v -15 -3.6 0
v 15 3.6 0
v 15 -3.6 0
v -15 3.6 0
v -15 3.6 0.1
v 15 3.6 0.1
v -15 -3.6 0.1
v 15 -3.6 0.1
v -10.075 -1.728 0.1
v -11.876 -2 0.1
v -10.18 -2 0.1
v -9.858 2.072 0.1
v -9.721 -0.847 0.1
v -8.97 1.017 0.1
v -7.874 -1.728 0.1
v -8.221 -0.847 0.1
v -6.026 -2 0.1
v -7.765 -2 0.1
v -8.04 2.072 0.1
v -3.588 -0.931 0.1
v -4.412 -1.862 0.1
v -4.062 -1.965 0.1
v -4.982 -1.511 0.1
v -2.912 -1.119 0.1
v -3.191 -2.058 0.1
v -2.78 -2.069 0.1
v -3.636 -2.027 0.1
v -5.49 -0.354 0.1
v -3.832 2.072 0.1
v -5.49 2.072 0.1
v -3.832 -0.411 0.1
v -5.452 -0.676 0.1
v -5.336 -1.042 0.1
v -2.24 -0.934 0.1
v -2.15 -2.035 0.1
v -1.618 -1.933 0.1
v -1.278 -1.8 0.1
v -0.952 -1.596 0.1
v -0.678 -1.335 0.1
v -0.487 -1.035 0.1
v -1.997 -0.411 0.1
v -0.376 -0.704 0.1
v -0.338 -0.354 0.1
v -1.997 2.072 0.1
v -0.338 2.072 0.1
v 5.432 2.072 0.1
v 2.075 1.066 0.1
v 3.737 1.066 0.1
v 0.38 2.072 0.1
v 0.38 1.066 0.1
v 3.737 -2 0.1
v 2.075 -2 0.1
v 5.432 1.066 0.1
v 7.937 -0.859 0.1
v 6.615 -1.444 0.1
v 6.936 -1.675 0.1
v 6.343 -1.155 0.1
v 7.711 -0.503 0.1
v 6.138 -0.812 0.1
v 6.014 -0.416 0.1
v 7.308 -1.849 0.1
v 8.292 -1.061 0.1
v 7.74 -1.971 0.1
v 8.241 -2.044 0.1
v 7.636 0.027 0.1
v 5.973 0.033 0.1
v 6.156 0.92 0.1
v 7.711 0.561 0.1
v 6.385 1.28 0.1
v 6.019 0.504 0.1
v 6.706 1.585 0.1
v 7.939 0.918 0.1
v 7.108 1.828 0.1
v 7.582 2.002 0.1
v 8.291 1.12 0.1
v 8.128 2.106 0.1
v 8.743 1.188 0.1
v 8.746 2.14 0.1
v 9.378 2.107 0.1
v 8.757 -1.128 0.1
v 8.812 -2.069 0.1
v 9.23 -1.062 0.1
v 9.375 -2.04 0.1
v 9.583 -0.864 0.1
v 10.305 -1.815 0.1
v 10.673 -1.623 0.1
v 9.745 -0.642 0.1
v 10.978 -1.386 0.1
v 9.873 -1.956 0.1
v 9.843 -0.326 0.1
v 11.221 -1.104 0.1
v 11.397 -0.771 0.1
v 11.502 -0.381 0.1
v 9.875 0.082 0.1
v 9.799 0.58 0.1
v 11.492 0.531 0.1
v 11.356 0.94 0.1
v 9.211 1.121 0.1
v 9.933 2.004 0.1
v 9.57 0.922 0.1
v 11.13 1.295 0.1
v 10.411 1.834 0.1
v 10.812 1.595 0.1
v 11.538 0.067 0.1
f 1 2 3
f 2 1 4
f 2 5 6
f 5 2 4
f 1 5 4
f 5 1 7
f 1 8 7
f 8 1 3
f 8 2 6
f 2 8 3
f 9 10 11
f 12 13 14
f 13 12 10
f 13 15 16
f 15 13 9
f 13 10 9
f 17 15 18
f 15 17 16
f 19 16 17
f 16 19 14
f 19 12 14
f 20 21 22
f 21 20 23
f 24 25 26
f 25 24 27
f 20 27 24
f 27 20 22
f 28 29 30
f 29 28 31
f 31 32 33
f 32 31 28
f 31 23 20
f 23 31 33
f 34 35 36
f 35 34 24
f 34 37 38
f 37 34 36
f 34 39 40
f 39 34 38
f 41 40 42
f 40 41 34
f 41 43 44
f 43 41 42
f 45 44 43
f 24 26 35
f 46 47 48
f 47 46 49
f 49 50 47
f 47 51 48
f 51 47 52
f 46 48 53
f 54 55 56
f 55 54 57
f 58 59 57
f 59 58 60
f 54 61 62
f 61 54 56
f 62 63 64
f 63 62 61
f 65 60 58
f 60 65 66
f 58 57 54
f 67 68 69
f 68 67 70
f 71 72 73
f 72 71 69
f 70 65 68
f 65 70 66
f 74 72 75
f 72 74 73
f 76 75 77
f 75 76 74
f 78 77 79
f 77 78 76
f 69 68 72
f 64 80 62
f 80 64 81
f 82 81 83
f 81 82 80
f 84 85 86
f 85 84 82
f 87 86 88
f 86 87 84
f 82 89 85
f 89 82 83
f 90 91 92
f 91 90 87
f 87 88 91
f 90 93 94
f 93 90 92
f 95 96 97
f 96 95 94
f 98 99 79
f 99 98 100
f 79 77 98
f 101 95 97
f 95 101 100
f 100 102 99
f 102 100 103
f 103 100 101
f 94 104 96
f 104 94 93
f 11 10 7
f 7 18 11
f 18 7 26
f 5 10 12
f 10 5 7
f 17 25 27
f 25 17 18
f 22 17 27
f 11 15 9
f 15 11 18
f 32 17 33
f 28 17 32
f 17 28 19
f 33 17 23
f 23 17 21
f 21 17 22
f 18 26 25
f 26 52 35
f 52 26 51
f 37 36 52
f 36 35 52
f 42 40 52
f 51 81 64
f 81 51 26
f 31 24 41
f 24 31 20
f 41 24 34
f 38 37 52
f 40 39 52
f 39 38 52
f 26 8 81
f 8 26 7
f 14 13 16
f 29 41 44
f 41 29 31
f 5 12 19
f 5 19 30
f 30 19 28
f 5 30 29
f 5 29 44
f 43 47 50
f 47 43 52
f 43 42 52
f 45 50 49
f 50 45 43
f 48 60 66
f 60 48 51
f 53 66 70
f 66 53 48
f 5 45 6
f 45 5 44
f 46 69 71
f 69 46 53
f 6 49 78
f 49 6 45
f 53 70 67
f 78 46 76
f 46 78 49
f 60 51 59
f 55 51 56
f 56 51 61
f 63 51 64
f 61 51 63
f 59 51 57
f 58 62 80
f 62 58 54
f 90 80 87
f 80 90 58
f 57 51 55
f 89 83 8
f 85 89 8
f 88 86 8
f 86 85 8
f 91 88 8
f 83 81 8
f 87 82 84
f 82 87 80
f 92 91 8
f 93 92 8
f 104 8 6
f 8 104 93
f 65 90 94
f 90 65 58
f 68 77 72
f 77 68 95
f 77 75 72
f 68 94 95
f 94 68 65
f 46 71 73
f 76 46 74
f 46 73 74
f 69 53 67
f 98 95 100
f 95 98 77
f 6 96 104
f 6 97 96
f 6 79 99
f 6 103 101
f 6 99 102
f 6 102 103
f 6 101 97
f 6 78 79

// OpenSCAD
// file: ../p/4-4edge.scad
use <../lib.scad>
$fa=1; $fs=0.2;
function ldraw_lib__4_4edge(realsolid=false) = [
// 0 Circle 1.0
// 0 Name: 4-4edge.dat
// 0 Author: James Jessiman
// 0 !LDRAW_ORG Primitive UPDATE 2017-01
// 0 !LICENSE Licensed under CC BY 2.0 and CC BY 4.0 : see CAreadme.txt
// 
// 0 BFC CERTIFY CCW
  [0,"BFC","CERTIFY"],
  [0,"BFC","CCW"],
// 
// 0 !HISTORY 1998-12-15 [PTadmin] Official Update 1998-10
// 0 !HISTORY 2005-12-28 [PTadmin] Official Update 2005-01
// 0 !HISTORY 2007-06-24 [PTadmin] Header formatted for Contributor Agreement
// 0 !HISTORY 2008-07-01 [PTadmin] Official Update 2008-01
// 0 !HISTORY 2017-01-15 [Steffen] BFCed
// 0 !HISTORY 2017-12-30 [PTadmin] Official Update 2017-01
// 
// 
// 2 24 1 0 0 0.9239 0 0.3827
  [2,24,1,0,0,0.9239,0,0.3827],
// 2 24 0.9239 0 0.3827 0.7071 0 0.7071
  [2,24,0.9239,0,0.3827,0.7071,0,0.7071],
// 2 24 0.7071 0 0.7071 0.3827 0 0.9239
  [2,24,0.7071,0,0.7071,0.3827,0,0.9239],
// 2 24 0.3827 0 0.9239 0 0 1
  [2,24,0.3827,0,0.9239,0,0,1],
// 2 24 0 0 1 -0.3827 0 0.9239
  [2,24,0,0,1,-0.3827,0,0.9239],
// 2 24 -0.3827 0 0.9239 -0.7071 0 0.7071
  [2,24,-0.3827,0,0.9239,-0.7071,0,0.7071],
// 2 24 -0.7071 0 0.7071 -0.9239 0 0.3827
  [2,24,-0.7071,0,0.7071,-0.9239,0,0.3827],
// 2 24 -0.9239 0 0.3827 -1 0 -0
  [2,24,-0.9239,0,0.3827,-1,0,-0],
// 2 24 -1 0 -0 -0.9239 0 -0.3827
  [2,24,-1,0,-0,-0.9239,0,-0.3827],
// 2 24 -0.9239 0 -0.3827 -0.7071 0 -0.7071
  [2,24,-0.9239,0,-0.3827,-0.7071,0,-0.7071],
// 2 24 -0.7071 0 -0.7071 -0.3827 0 -0.9239
  [2,24,-0.7071,0,-0.7071,-0.3827,0,-0.9239],
// 2 24 -0.3827 0 -0.9239 0 0 -1
  [2,24,-0.3827,0,-0.9239,0,0,-1],
// 2 24 0 0 -1 0.3827 0 -0.9239
  [2,24,0,0,-1,0.3827,0,-0.9239],
// 2 24 0.3827 0 -0.9239 0.7071 0 -0.7071
  [2,24,0.3827,0,-0.9239,0.7071,0,-0.7071],
// 2 24 0.7071 0 -0.7071 0.9239 0 -0.3827
  [2,24,0.7071,0,-0.7071,0.9239,0,-0.3827],
// 2 24 0.9239 0 -0.3827 1 0 0
  [2,24,0.9239,0,-0.3827,1,0,0],
];
module ldraw_lib__4_4edge(step=0, col=false, unit=2/5, alt=false, line=0.2, solid=!$preview)
    makepoly(ldraw_lib__4_4edge(solid), step=step, col=col, unit=unit, alt=alt, line=line, solid=solid);
ldraw_lib__4_4edge(line=0.2);
// file: ../p/4-4disc.scad
use <../lib.scad>
$fa=1; $fs=0.2;
function ldraw_lib__4_4disc(realsolid=false) = [
// 0 Disc 1.0
// 0 Name: 4-4disc.dat
// 0 Author: James Jessiman
// 0 !LDRAW_ORG Primitive UPDATE 2002-02
// 0 !LICENSE Licensed under CC BY 2.0 and CC BY 4.0 : see CAreadme.txt
// 
// 0 BFC CERTIFY CCW
  [0,"BFC","CERTIFY"],
  [0,"BFC","CCW"],
// 
// 0 !HISTORY 1998-12-15 [PTadmin] Official Update 1998-10
// 0 !HISTORY 2002-03-23 [sbliss] Added BFC statement
// 0 !HISTORY 2002-04-25 [PTadmin] Official Update 2002-02
// 0 !HISTORY 2007-06-24 [PTadmin] Header formatted for Contributor Agreement
// 0 !HISTORY 2008-07-01 [PTadmin] Official Update 2008-01
// 
// 
// 3 16 0 0 0 1 0 0 0.9239 0 0.3827
  [3,16,0,0,0,1,0,0,0.9239,0,0.3827],
// 3 16 0 0 0 0.9239 0 0.3827 0.7071 0 0.7071
  [3,16,0,0,0,0.9239,0,0.3827,0.7071,0,0.7071],
// 3 16 0 0 0 0.7071 0 0.7071 0.3827 0 0.9239
  [3,16,0,0,0,0.7071,0,0.7071,0.3827,0,0.9239],
// 3 16 0 0 0 0.3827 0 0.9239 0 0 1
  [3,16,0,0,0,0.3827,0,0.9239,0,0,1],
// 3 16 0 0 0 0 0 1 -0.3827 0 0.9239
  [3,16,0,0,0,0,0,1,-0.3827,0,0.9239],
// 3 16 0 0 0 -0.3827 0 0.9239 -0.7071 0 0.7071
  [3,16,0,0,0,-0.3827,0,0.9239,-0.7071,0,0.7071],
// 3 16 0 0 0 -0.7071 0 0.7071 -0.9239 0 0.3827
  [3,16,0,0,0,-0.7071,0,0.7071,-0.9239,0,0.3827],
// 3 16 0 0 0 -0.9239 0 0.3827 -1 0 -0
  [3,16,0,0,0,-0.9239,0,0.3827,-1,0,-0],
// 3 16 0 0 0 -1 0 -0 -0.9239 0 -0.3827
  [3,16,0,0,0,-1,0,-0,-0.9239,0,-0.3827],
// 3 16 0 0 0 -0.9239 0 -0.3827 -0.7071 0 -0.7071
  [3,16,0,0,0,-0.9239,0,-0.3827,-0.7071,0,-0.7071],
// 3 16 0 0 0 -0.7071 0 -0.7071 -0.3827 0 -0.9239
  [3,16,0,0,0,-0.7071,0,-0.7071,-0.3827,0,-0.9239],
// 3 16 0 0 0 -0.3827 0 -0.9239 0 0 -1
  [3,16,0,0,0,-0.3827,0,-0.9239,0,0,-1],
// 3 16 0 0 0 0 0 -1 0.3827 0 -0.9239
  [3,16,0,0,0,0,0,-1,0.3827,0,-0.9239],
// 3 16 0 0 0 0.3827 0 -0.9239 0.7071 0 -0.7071
  [3,16,0,0,0,0.3827,0,-0.9239,0.7071,0,-0.7071],
// 3 16 0 0 0 0.7071 0 -0.7071 0.9239 0 -0.3827
  [3,16,0,0,0,0.7071,0,-0.7071,0.9239,0,-0.3827],
// 3 16 0 0 0 0.9239 0 -0.3827 1 0 0
  [3,16,0,0,0,0.9239,0,-0.3827,1,0,0],
// 0
];
module ldraw_lib__4_4disc(step=0, col=false, unit=2/5, alt=false, line=0.2, solid=!$preview)
    makepoly(ldraw_lib__4_4disc(solid), step=step, col=col, unit=unit, alt=alt, line=line, solid=solid);
ldraw_lib__4_4disc(line=0.2);
// file: ../p/4-4cyli.scad
use <../lib.scad>
$fa=1; $fs=0.2;
function ldraw_lib__4_4cyli(realsolid=false) = [
// 0 Cylinder 1.0
// 0 Name: 4-4cyli.dat
// 0 Author: James Jessiman
// 0 !LDRAW_ORG Primitive UPDATE 2005-01
// 0 !LICENSE Licensed under CC BY 2.0 and CC BY 4.0 : see CAreadme.txt
// 
// 0 BFC CERTIFY CCW
  [0,"BFC","CERTIFY"],
  [0,"BFC","CCW"],
// 
// 0 !HISTORY 1998-12-15 [PTadmin] Official Update 1998-10
// 0 !HISTORY 2002-03-23 [sbliss] Added BFC statement; merged headers from files in distributions LDraw 0.27 and Complete.
// 0 !HISTORY 2002-04-25 [PTadmin] Official Update 2002-02
// 0 !HISTORY 2004-12-14 [guyvivan] BFC CCW
// 0 !HISTORY 2005-12-28 [PTadmin] Official Update 2005-01
// 0 !HISTORY 2007-06-24 [PTadmin] Header formatted for Contributor Agreement
// 0 !HISTORY 2008-07-01 [PTadmin] Official Update 2008-01
// 
// 
// 4 16 1 1 0 0.9239 1 0.3827 0.9239 0 0.3827 1 0 0
  [4,16,1,1,0,0.9239,1,0.3827,0.9239,0,0.3827,1,0,0],
// 5 24 1 0 0 1 1 0 0.9239 0 0.3827 0.9239 0 -0.3827
  [5,24,1,0,0,1,1,0,0.9239,0,0.3827,0.9239,0,-0.3827],
// 4 16 0.9239 1 0.3827 0.7071 1 0.7071 0.7071 0 0.7071 0.9239 0 0.3827
  [4,16,0.9239,1,0.3827,0.7071,1,0.7071,0.7071,0,0.7071,0.9239,0,0.3827],
// 5 24 0.9239 0 0.3827 0.9239 1 0.3827 0.7071 0 0.7071 1 0 0
  [5,24,0.9239,0,0.3827,0.9239,1,0.3827,0.7071,0,0.7071,1,0,0],
// 4 16 0.7071 1 0.7071 0.3827 1 0.9239 0.3827 0 0.9239 0.7071 0 0.7071
  [4,16,0.7071,1,0.7071,0.3827,1,0.9239,0.3827,0,0.9239,0.7071,0,0.7071],
// 5 24 0.7071 0 0.7071 0.7071 1 0.7071 0.3827 0 0.9239 0.9239 0 0.3827
  [5,24,0.7071,0,0.7071,0.7071,1,0.7071,0.3827,0,0.9239,0.9239,0,0.3827],
// 4 16 0.3827 1 0.9239 0 1 1 0 0 1 0.3827 0 0.9239
  [4,16,0.3827,1,0.9239,0,1,1,0,0,1,0.3827,0,0.9239],
// 5 24 0.3827 0 0.9239 0.3827 1 0.9239 0 0 1 0.7071 0 0.7071
  [5,24,0.3827,0,0.9239,0.3827,1,0.9239,0,0,1,0.7071,0,0.7071],
// 4 16 0 1 1 -0.3827 1 0.9239 -0.3827 0 0.9239 0 0 1
  [4,16,0,1,1,-0.3827,1,0.9239,-0.3827,0,0.9239,0,0,1],
// 5 24 0 0 1 0 1 1 -0.3827 0 0.9239 0.3827 0 0.9239
  [5,24,0,0,1,0,1,1,-0.3827,0,0.9239,0.3827,0,0.9239],
// 4 16 -0.3827 1 0.9239 -0.7071 1 0.7071 -0.7071 0 0.7071 -0.3827 0 0.9239
  [4,16,-0.3827,1,0.9239,-0.7071,1,0.7071,-0.7071,0,0.7071,-0.3827,0,0.9239],
// 5 24 -0.3827 0 0.9239 -0.3827 1 0.9239 -0.7071 0 0.7071 0 0 1
  [5,24,-0.3827,0,0.9239,-0.3827,1,0.9239,-0.7071,0,0.7071,0,0,1],
// 4 16 -0.7071 1 0.7071 -0.9239 1 0.3827 -0.9239 0 0.3827 -0.7071 0 0.7071
  [4,16,-0.7071,1,0.7071,-0.9239,1,0.3827,-0.9239,0,0.3827,-0.7071,0,0.7071],
// 5 24 -0.7071 0 0.7071 -0.7071 1 0.7071 -0.9239 0 0.3827 -0.3827 0 0.9239
  [5,24,-0.7071,0,0.7071,-0.7071,1,0.7071,-0.9239,0,0.3827,-0.3827,0,0.9239],
// 4 16 -0.9239 1 0.3827 -1 1 0 -1 0 0 -0.9239 0 0.3827
  [4,16,-0.9239,1,0.3827,-1,1,0,-1,0,0,-0.9239,0,0.3827],
// 5 24 -0.9239 0 0.3827 -0.9239 1 0.3827 -1 0 0 -0.7071 0 0.7071
  [5,24,-0.9239,0,0.3827,-0.9239,1,0.3827,-1,0,0,-0.7071,0,0.7071],
// 4 16 -1 1 0 -0.9239 1 -0.3827 -0.9239 0 -0.3827 -1 0 0
  [4,16,-1,1,0,-0.9239,1,-0.3827,-0.9239,0,-0.3827,-1,0,0],
// 5 24 -1 0 0 -1 1 0 -0.9239 0 -0.3827 -0.9239 0 0.3827
  [5,24,-1,0,0,-1,1,0,-0.9239,0,-0.3827,-0.9239,0,0.3827],
// 4 16 -0.9239 1 -0.3827 -0.7071 1 -0.7071 -0.7071 0 -0.7071 -0.9239 0 -0.3827
  [4,16,-0.9239,1,-0.3827,-0.7071,1,-0.7071,-0.7071,0,-0.7071,-0.9239,0,-0.3827],
// 5 24 -0.9239 0 -0.3827 -0.9239 1 -0.3827 -0.7071 0 -0.7071 -1 0 0
  [5,24,-0.9239,0,-0.3827,-0.9239,1,-0.3827,-0.7071,0,-0.7071,-1,0,0],
// 4 16 -0.7071 1 -0.7071 -0.3827 1 -0.9239 -0.3827 0 -0.9239 -0.7071 0 -0.7071
  [4,16,-0.7071,1,-0.7071,-0.3827,1,-0.9239,-0.3827,0,-0.9239,-0.7071,0,-0.7071],
// 5 24 -0.7071 0 -0.7071 -0.7071 1 -0.7071 -0.3827 0 -0.9239 -0.9239 0 -0.3827
  [5,24,-0.7071,0,-0.7071,-0.7071,1,-0.7071,-0.3827,0,-0.9239,-0.9239,0,-0.3827],
// 4 16 -0.3827 1 -0.9239 0 1 -1 0 0 -1 -0.3827 0 -0.9239
  [4,16,-0.3827,1,-0.9239,0,1,-1,0,0,-1,-0.3827,0,-0.9239],
// 5 24 -0.3827 0 -0.9239 -0.3827 1 -0.9239 0 0 -1 -0.7071 0 -0.7071
  [5,24,-0.3827,0,-0.9239,-0.3827,1,-0.9239,0,0,-1,-0.7071,0,-0.7071],
// 4 16 0 1 -1 0.3827 1 -0.9239 0.3827 0 -0.9239 0 0 -1
  [4,16,0,1,-1,0.3827,1,-0.9239,0.3827,0,-0.9239,0,0,-1],
// 5 24 0 0 -1 0 1 -1 0.3827 0 -0.9239 -0.3827 0 -0.9239
  [5,24,0,0,-1,0,1,-1,0.3827,0,-0.9239,-0.3827,0,-0.9239],
// 4 16 0.3827 1 -0.9239 0.7071 1 -0.7071 0.7071 0 -0.7071 0.3827 0 -0.9239
  [4,16,0.3827,1,-0.9239,0.7071,1,-0.7071,0.7071,0,-0.7071,0.3827,0,-0.9239],
// 5 24 0.3827 0 -0.9239 0.3827 1 -0.9239 0.7071 0 -0.7071 0 0 -1
  [5,24,0.3827,0,-0.9239,0.3827,1,-0.9239,0.7071,0,-0.7071,0,0,-1],
// 4 16 0.7071 1 -0.7071 0.9239 1 -0.3827 0.9239 0 -0.3827 0.7071 0 -0.7071
  [4,16,0.7071,1,-0.7071,0.9239,1,-0.3827,0.9239,0,-0.3827,0.7071,0,-0.7071],
// 5 24 0.7071 0 -0.7071 0.7071 1 -0.7071 0.9239 0 -0.3827 0.3827 0 -0.9239
  [5,24,0.7071,0,-0.7071,0.7071,1,-0.7071,0.9239,0,-0.3827,0.3827,0,-0.9239],
// 4 16 0.9239 1 -0.3827 1 1 0 1 0 0 0.9239 0 -0.3827
  [4,16,0.9239,1,-0.3827,1,1,0,1,0,0,0.9239,0,-0.3827],
// 5 24 0.9239 0 -0.3827 0.9239 1 -0.3827 1 0 0 0.7071 0 -0.7071
  [5,24,0.9239,0,-0.3827,0.9239,1,-0.3827,1,0,0,0.7071,0,-0.7071],
// 0
];
module ldraw_lib__4_4cyli(step=0, col=false, unit=2/5, alt=false, line=0.2, solid=!$preview)
    makepoly(ldraw_lib__4_4cyli(solid), step=step, col=col, unit=unit, alt=alt, line=line, solid=solid);
ldraw_lib__4_4cyli(line=0.2);
// file: ../p/stud3.scad
use <../lib.scad>
use <4-4cyli.scad>
use <4-4disc.scad>
use <4-4edge.scad>
$fa=1; $fs=0.2;
function ldraw_lib__stud3(realsolid=false) = realsolid ? 
    [openscad(translate([0,0,-eps()], o=cylinder(4+eps(), r=4)),2)] : [
// 0 Stud Tube Solid
// 0 Name: stud3.dat
// 0 Author: James Jessiman
// 0 !LDRAW_ORG Primitive UPDATE 2012-01
// 0 !LICENSE Licensed under CC BY 2.0 and CC BY 4.0 : see CAreadme.txt
// 
// 0 BFC CERTIFY CCW
  [0,"BFC","CERTIFY"],
  [0,"BFC","CCW"],
// 
// 0 !HISTORY 2002-04-04 [sbliss] Modified for BFC compliance
// 0 !HISTORY 2002-04-25 [PTadmin] Official Update 2002-02
// 0 !HISTORY 2007-06-24 [PTadmin] Header formatted for Contributor Agreement
// 0 !HISTORY 2008-07-01 [PTadmin] Official Update 2008-01
// 0 !HISTORY 2012-02-16 [Philo] Changed to CCW
// 0 !HISTORY 2012-03-30 [PTadmin] Official Update 2012-01
// 
// 
// 1 16 0 -4 0 4 0 0 0 1 0 0 0 4 4-4edge.dat
  [1,16,0,-4,0,4,0,0,0,1,0,0,0,4, ldraw_lib__4_4edge(realsolid)],
// 1 16 0 0 0 4 0 0 0 1 0 0 0 4 4-4edge.dat
  [1,16,0,0,0,4,0,0,0,1,0,0,0,4, ldraw_lib__4_4edge(realsolid)],
// 1 16 0 -4 0 4 0 0 0 1 0 0 0 4 4-4disc.dat
  [1,16,0,-4,0,4,0,0,0,1,0,0,0,4, ldraw_lib__4_4disc(realsolid)],
// 1 16 0 -4 0 4 0 0 0 4 0 0 0 4 4-4cyli.dat
  [1,16,0,-4,0,4,0,0,0,4,0,0,0,4, ldraw_lib__4_4cyli(realsolid)],
];
module ldraw_lib__stud3(step=0, col=false, unit=2/5, alt=false, line=0.2, solid=!$preview)
    makepoly(ldraw_lib__stud3(solid), step=step, col=col, unit=unit, alt=alt, line=line, solid=solid);
ldraw_lib__stud3(line=0.2);
// file: ../p/stud.scad
use <../lib.scad>
use <4-4cyli.scad>
use <4-4disc.scad>
use <4-4edge.scad>
$fa=1; $fs=0.2;
function ldraw_lib__stud(realsolid=false) = realsolid ? 
    [openscad(translate([0,0,-eps()], o=cylinder(4+eps(), r=6)),2)] : [
// 0 Stud
// 0 Name: stud.dat
// 0 Author: James Jessiman
// 0 !LDRAW_ORG Primitive UPDATE 2012-01
// 0 !LICENSE Licensed under CC BY 2.0 and CC BY 4.0 : see CAreadme.txt
// 
// 0 BFC CERTIFY CCW
  [0,"BFC","CERTIFY"],
  [0,"BFC","CCW"],
// 
// 0 !HISTORY 2002-04-04 [sbliss] Modified for BFC compliance
// 0 !HISTORY 2002-04-25 [PTadmin] Official Update 2002-02
// 0 !HISTORY 2007-06-24 [PTadmin] Header formatted for Contributor Agreement
// 0 !HISTORY 2008-07-01 [PTadmin] Official Update 2008-01
// 0 !HISTORY 2012-02-16 [Philo] Changed to CCW
// 0 !HISTORY 2012-03-30 [PTadmin] Official Update 2012-01
// 
// 
// 1 16 0 0 0 6 0 0 0 1 0 0 0 6 4-4edge.dat
  [1,16,0,0,0,6,0,0,0,1,0,0,0,6, ldraw_lib__4_4edge(realsolid)],
// 1 16 0 -4 0 6 0 0 0 1 0 0 0 6 4-4edge.dat
  [1,16,0,-4,0,6,0,0,0,1,0,0,0,6, ldraw_lib__4_4edge(realsolid)],
// 1 16 0 0 0 6 0 0 0 -4 0 0 0 6 4-4cyli.dat
  [1,16,0,0,0,6,0,0,0,-4,0,0,0,6, ldraw_lib__4_4cyli(realsolid)],
// 1 16 0 -4 0 6 0 0 0 1 0 0 0 6 4-4disc.dat
  [1,16,0,-4,0,6,0,0,0,1,0,0,0,6, ldraw_lib__4_4disc(realsolid)],
];
module ldraw_lib__stud(step=0, col=false, unit=2/5, alt=false, line=0.2, solid=!$preview)
    makepoly(ldraw_lib__stud(solid), step=step, col=col, unit=unit, alt=alt, line=line, solid=solid);
ldraw_lib__stud(line=0.2);
// file: ../p/box5.scad
use <../lib.scad>
$fa=1; $fs=0.2;
function ldraw_lib__box5(realsolid=false) = [
// 0 Box with 5 Faces and All Edges
// 0 Name: box5.dat
// 0 Author: James Jessiman
// 0 !LDRAW_ORG Primitive UPDATE 2012-01
// 0 !LICENSE Licensed under CC BY 2.0 and CC BY 4.0 : see CAreadme.txt
// 
// 0 BFC CERTIFY CCW
  [0,"BFC","CERTIFY"],
  [0,"BFC","CCW"],
// 
// 0 !HISTORY 2002-04-03 [sbliss] Modified for BFC compliance
// 0 !HISTORY 2002-04-25 [PTadmin] Official Update 2002-02
// 0 !HISTORY 2007-06-24 [PTadmin] Header formatted for Contributor Agreement
// 0 !HISTORY 2008-07-01 [PTadmin] Official Update 2008-01
// 0 !HISTORY 2012-02-16 [Philo] Changed to CCW
// 0 !HISTORY 2012-03-30 [PTadmin] Official Update 2012-01
// 
// 
// 2 24 1 1 1 -1 1 1
  [2,24,1,1,1,-1,1,1],
// 2 24 -1 1 1 -1 1 -1
  [2,24,-1,1,1,-1,1,-1],
// 2 24 -1 1 -1 1 1 -1
  [2,24,-1,1,-1,1,1,-1],
// 2 24 1 1 -1 1 1 1
  [2,24,1,1,-1,1,1,1],
// 2 24 1 0 1 -1 0 1
  [2,24,1,0,1,-1,0,1],
// 2 24 -1 0 1 -1 0 -1
  [2,24,-1,0,1,-1,0,-1],
// 2 24 -1 0 -1 1 0 -1
  [2,24,-1,0,-1,1,0,-1],
// 2 24 1 0 -1 1 0 1
  [2,24,1,0,-1,1,0,1],
// 2 24 1 0 1 1 1 1
  [2,24,1,0,1,1,1,1],
// 2 24 -1 0 1 -1 1 1
  [2,24,-1,0,1,-1,1,1],
// 2 24 1 0 -1 1 1 -1
  [2,24,1,0,-1,1,1,-1],
// 2 24 -1 0 -1 -1 1 -1
  [2,24,-1,0,-1,-1,1,-1],
// 4 16 -1 1 1 1 1 1 1 1 -1 -1 1 -1
  [4,16,-1,1,1,1,1,1,1,1,-1,-1,1,-1],
// 4 16 -1 1 1 -1 0 1 1 0 1 1 1 1
  [4,16,-1,1,1,-1,0,1,1,0,1,1,1,1],
// 4 16 -1 1 -1 -1 0 -1 -1 0 1 -1 1 1
  [4,16,-1,1,-1,-1,0,-1,-1,0,1,-1,1,1],
// 4 16 1 1 -1 1 0 -1 -1 0 -1 -1 1 -1
  [4,16,1,1,-1,1,0,-1,-1,0,-1,-1,1,-1],
// 4 16 1 1 1 1 0 1 1 0 -1 1 1 -1
  [4,16,1,1,1,1,0,1,1,0,-1,1,1,-1],
];
module ldraw_lib__box5(step=0, col=false, unit=2/5, alt=false, line=0.2, solid=!$preview)
    makepoly(ldraw_lib__box5(solid), step=step, col=col, unit=unit, alt=alt, line=line, solid=solid);
ldraw_lib__box5(line=0.2);
// file: ../p/box4t.scad
use <../lib.scad>
$fa=1; $fs=0.2;
function ldraw_lib__box4t(realsolid=false) = [
// 0 Box with 4 Adjacent Faces and All Edges
// 0 Name: box4t.dat
// 0 Author: Tore Eriksson [Tore_Eriksson]
// 0 !LDRAW_ORG Primitive UPDATE 2003-02
// 0 !LICENSE Licensed under CC BY 2.0 and CC BY 4.0 : see CAreadme.txt
// 
// 0 BFC CERTIFY CCW
  [0,"BFC","CERTIFY"],
  [0,"BFC","CCW"],
// 
// 0 !HISTORY 1997-09-29 [PTadmin] Official Update 1997-15
// 0 !HISTORY 2002-08-31 [izanette] Modified with WINDZ for BFC compliance
// 0 !HISTORY 2003-08-01 [PTadmin] Official Update 2003-02
// 0 !HISTORY 2007-06-24 [PTadmin] Header formatted for Contributor Agreement
// 0 !HISTORY 2008-07-01 [PTadmin] Official Update 2008-01
// 
// 
// 2 24 1 1 1 -1 1 1
  [2,24,1,1,1,-1,1,1],
// 2 24 -1 1 1 -1 1 -1
  [2,24,-1,1,1,-1,1,-1],
// 2 24 -1 1 -1 1 1 -1
  [2,24,-1,1,-1,1,1,-1],
// 2 24 1 1 -1 1 1 1
  [2,24,1,1,-1,1,1,1],
// 2 24 1 0 1 -1 0 1
  [2,24,1,0,1,-1,0,1],
// 2 24 -1 0 1 -1 0 -1
  [2,24,-1,0,1,-1,0,-1],
// 2 24 -1 0 -1 1 0 -1
  [2,24,-1,0,-1,1,0,-1],
// 2 24 1 0 -1 1 0 1
  [2,24,1,0,-1,1,0,1],
// 2 24 1 0 1 1 1 1
  [2,24,1,0,1,1,1,1],
// 2 24 -1 0 1 -1 1 1
  [2,24,-1,0,1,-1,1,1],
// 2 24 1 0 -1 1 1 -1
  [2,24,1,0,-1,1,1,-1],
// 2 24 -1 0 -1 -1 1 -1
  [2,24,-1,0,-1,-1,1,-1],
// 4 16 1 1 1 1 1 -1 -1 1 -1 -1 1 1
  [4,16,1,1,1,1,1,-1,-1,1,-1,-1,1,1],
// 4 16 1 1 1 -1 1 1 -1 0 1 1 0 1
  [4,16,1,1,1,-1,1,1,-1,0,1,1,0,1],
// 4 16 -1 1 1 -1 1 -1 -1 0 -1 -1 0 1
  [4,16,-1,1,1,-1,1,-1,-1,0,-1,-1,0,1],
// 0 4 16 -1 1 -1 -1 0 -1 1 0 -1 1 1 -1
// 4 16 1 1 -1 1 1 1 1 0 1 1 0 -1
  [4,16,1,1,-1,1,1,1,1,0,1,1,0,-1],
// 0
];
module ldraw_lib__box4t(step=0, col=false, unit=2/5, alt=false, line=0.2, solid=!$preview)
    makepoly(ldraw_lib__box4t(solid), step=step, col=col, unit=unit, alt=alt, line=line, solid=solid);
ldraw_lib__box4t(line=0.2);
// file: s/3004s01.scad
use <../../lib.scad>
use <../../p/box4t.scad>
use <../../p/box5.scad>
use <../../p/stud.scad>
use <../../p/stud3.scad>
$fa=1; $fs=0.2;
function ldraw_lib__s__3004s01(realsolid=false) = [
// 0 ~Brick  1 x  2 without Front Face
// 0 Name: s\3004s01.dat
// 0 Author: James Jessiman
// 0 !LDRAW_ORG Subpart UPDATE 2003-03
// 0 !LICENSE Licensed under CC BY 2.0 and CC BY 4.0 : see CAreadme.txt
// 
// 0 BFC CERTIFY CCW
  [0,"BFC","CERTIFY"],
  [0,"BFC","CCW"],
// 
// 0 !HISTORY 2003-09-07 [jriley] Subfiling, BFC
// 0 !HISTORY 2003-12-19 [PTadmin] Official Update 2003-03
// 0 !HISTORY 2007-08-29 [PTadmin] Header formatted for Contributor Agreement
// 0 !HISTORY 2008-07-01 [PTadmin] Official Update 2008-01
// 
// 
// 1 16 0 4 0 1 0 0 0 -5 0 0 0 1 stud3.dat
  [1,16,0,4,0,1,0,0,0,-5,0,0,0,1, ldraw_lib__stud3(realsolid)],
// 0 BFC INVERTNEXT
  [0,"BFC","INVERTNEXT"],
// 1 16 0 24 0 16 0 0 0 -20 0 0 0 6 box5.dat
  [1,16,0,24,0,16,0,0,0,-20,0,0,0,6, ldraw_lib__box5(realsolid)],
// 4 16 20 24 10 16 24 6 -16 24 6 -20 24 10
  [4,16,20,24,10,16,24,6,-16,24,6,-20,24,10],
// 4 16 -20 24 10 -16 24 6 -16 24 -6 -20 24 -10
  [4,16,-20,24,10,-16,24,6,-16,24,-6,-20,24,-10],
// 4 16 -20 24 -10 -16 24 -6 16 24 -6 20 24 -10
  [4,16,-20,24,-10,-16,24,-6,16,24,-6,20,24,-10],
// 4 16 20 24 -10 16 24 -6 16 24 6 20 24 10
  [4,16,20,24,-10,16,24,-6,16,24,6,20,24,10],
// 1 16 0 24 0 20 0 0 0 -24 0 0 0 10 box4t.dat
  [1,16,0,24,0,20,0,0,0,-24,0,0,0,10, ldraw_lib__box4t(realsolid)],
// 1 16 10 0 0 1 0 0 0 1 0 0 0 1 stud.dat
  [1,16,10,0,0,1,0,0,0,1,0,0,0,1, ldraw_lib__stud(realsolid)],
// 1 16 -10 0 0 1 0 0 0 1 0 0 0 1 stud.dat
  [1,16,-10,0,0,1,0,0,0,1,0,0,0,1, ldraw_lib__stud(realsolid)],
// 0
];
module ldraw_lib__s__3004s01(step=0, col=false, unit=2/5, alt=false, line=0.2, solid=!$preview)
    makepoly(ldraw_lib__s__3004s01(solid), step=step, col=col, unit=unit, alt=alt, line=line, solid=solid);
ldraw_lib__s__3004s01(line=0.2);
// file: 3004.scad
use <../lib.scad>
use <s/3004s01.scad>
$fa=1; $fs=0.2;
function ldraw_lib__3004(realsolid=false) = [
// 0 Brick  1 x  2
// 0 Name: 3004.dat
// 0 Author: James Jessiman
// 0 !LDRAW_ORG Part UPDATE 2022-05
// 0 !LICENSE Licensed under CC BY 2.0 and CC BY 4.0 : see CAreadme.txt
// 
// 0 BFC CERTIFY CCW
  [0,"BFC","CERTIFY"],
  [0,"BFC","CCW"],
// 
// 0 !HISTORY 2001-10-26 [PTadmin] Official Update 2001-01
// 0 !HISTORY 2002-05-07 {unknown} BFC Certification
// 0 !HISTORY 2002-06-11 [PTadmin] Official Update 2002-03
// 0 !HISTORY 2007-05-07 [PTadmin] Header formatted for Contributor Agreement
// 0 !HISTORY 2008-07-01 [PTadmin] Official Update 2008-01
// 0 !HISTORY 2022-08-04 [MagFors] Using subfile
// 0 !HISTORY 2022-09-15 [PTadmin] Official Update 2022-05
// 
// 
// 1 16 0 0 0 1 0 0 0 1 0 0 0 1 s\3004s01.dat
  [1,16,0,0,0,1,0,0,0,1,0,0,0,1, ldraw_lib__s__3004s01(realsolid)],
// 4 16 -20 24 -10 20 24 -10 20 0 -10 -20 0 -10
  [4,16,-20,24,-10,20,24,-10,20,0,-10,-20,0,-10],
];
module ldraw_lib__3004(step=0, col=false, unit=2/5, alt=false, line=0.2, solid=!$preview)
    makepoly(ldraw_lib__3004(solid), step=step, col=col, unit=unit, alt=alt, line=line, solid=solid);
ldraw_lib__3004(line=0.2);
// file: ../p/box5-12.scad
use <../lib.scad>
$fa=1; $fs=0.2;
function ldraw_lib__box5_12(realsolid=false) = [
// 0 Box with 5 Faces without Any Edges
// 0 Name: box5-12.dat
// 0 Author: Chris Dee [cwdee]
// 0 !LDRAW_ORG Primitive UPDATE 2009-02
// 0 !LICENSE Licensed under CC BY 2.0 and CC BY 4.0 : see CAreadme.txt
// 
// 0 BFC CERTIFY CCW
  [0,"BFC","CERTIFY"],
  [0,"BFC","CCW"],
// 
// 0 !HISTORY 2009-09-03 [PTadmin] Official Update 2009-02
// 
// 
// 4 16 1 1 1 1 1 -1 -1 1 -1 -1 1 1
  [4,16,1,1,1,1,1,-1,-1,1,-1,-1,1,1],
// 4 16 -1 0 1 1 0 1 1 1 1 -1 1 1
  [4,16,-1,0,1,1,0,1,1,1,1,-1,1,1],
// 4 16 -1 0 -1 -1 0 1 -1 1 1 -1 1 -1
  [4,16,-1,0,-1,-1,0,1,-1,1,1,-1,1,-1],
// 4 16 1 0 -1 -1 0 -1 -1 1 -1 1 1 -1
  [4,16,1,0,-1,-1,0,-1,-1,1,-1,1,1,-1],
// 4 16 1 0 1 1 0 -1 1 1 -1 1 1 1
  [4,16,1,0,1,1,0,-1,1,1,-1,1,1,1],
// 0
];
module ldraw_lib__box5_12(step=0, col=false, unit=2/5, alt=false, line=0.2, solid=!$preview)
    makepoly(ldraw_lib__box5_12(solid), step=step, col=col, unit=unit, alt=alt, line=line, solid=solid);
ldraw_lib__box5_12(line=0.2);
// main file
use <../lib.scad>
use <../p/box5-12.scad>
$fa=1; $fs=0.2;
function ldraw_lib__190435a(realsolid=false) = [
// 0 Sticker  0.9 x  3.7 with "AUTO"
// 0 Name: 190435a.dat
// 0 Author: J.C. Tchang [tchang]
// 0 !LDRAW_ORG Part UPDATE 2013-02
// 0 !LICENSE Licensed under CC BY 2.0 and CC BY 4.0 : see CAreadme.txt
// 
// 0 BFC CERTIFY CCW
  [0,"BFC","CERTIFY"],
  [0,"BFC","CCW"],
// 
// 0 !KEYWORDS set 646
// 
// 0 !HISTORY 2013-12-23 [PTadmin] Official Update 2013-02
// 
// 
// 1 16 0 -0.25 0 37.5 0 0 0 0.25 0 0 0 9 box5-12.dat
  [1,16,0,-0.25,0,37.5,0,0,0,0.25,0,0,0,9, ldraw_lib__box5_12(realsolid)],
// 0 //
// 3 15 -25.188 -0.25 -4.32 -29.689 -0.25 -5 -25.451 -0.25 -5
  [3,15,-25.188,-0.25,-4.32,-29.689,-0.25,-5,-25.451,-0.25,-5],
// 4 15 -24.646 -0.25 5.18 -29.689 -0.25 -5 -24.303 -0.25 -2.117 -22.425 -0.25 2.542
  [4,15,-24.646,-0.25,5.18,-29.689,-0.25,-5,-24.303,-0.25,-2.117,-22.425,-0.25,2.542],
// 4 15 -24.303 -0.25 -2.117 -25.188 -0.25 -4.32 -19.684 -0.25 -4.32 -20.552 -0.25 -2.117
  [4,15,-24.303,-0.25,-2.117,-25.188,-0.25,-4.32,-19.684,-0.25,-4.32,-20.552,-0.25,-2.117],
// 3 15 -24.303 -0.25 -2.117 -29.689 -0.25 -5 -25.188 -0.25 -4.32
  [3,15,-24.303,-0.25,-2.117,-29.689,-0.25,-5,-25.188,-0.25,-4.32],
// 4 15 -19.684 -0.25 -4.32 -19.413 -0.25 -5 -15.066 -0.25 -5 -20.552 -0.25 -2.117
  [4,15,-19.684,-0.25,-4.32,-19.413,-0.25,-5,-15.066,-0.25,-5,-20.552,-0.25,-2.117],
// 4 15 -20.101 -0.25 5.18 -22.425 -0.25 2.542 -20.552 -0.25 -2.117 -15.066 -0.25 -5
  [4,15,-20.101,-0.25,5.18,-22.425,-0.25,2.542,-20.552,-0.25,-2.117,-15.066,-0.25,-5],
// 3 15 -20.101 -0.25 5.18 -24.646 -0.25 5.18 -22.425 -0.25 2.542
  [3,15,-20.101,-0.25,5.18,-24.646,-0.25,5.18,-22.425,-0.25,2.542],
// 4 15 -8.971 -0.25 -2.328 -12.456 -0.25 -3.777 -11.031 -0.25 -4.655 -10.156 -0.25 -4.912
  [4,15,-8.971,-0.25,-2.328,-12.456,-0.25,-3.777,-11.031,-0.25,-4.655,-10.156,-0.25,-4.912],
// 4 15 -7.281 -0.25 -2.797 -9.091 -0.25 -5.067 -7.977 -0.25 -5.146 -6.951 -0.25 -5.172
  [4,15,-7.281,-0.25,-2.797,-9.091,-0.25,-5.067,-7.977,-0.25,-5.146,-6.951,-0.25,-5.172],
// 4 15 -8.971 -0.25 -2.328 -10.156 -0.25 -4.912 -9.091 -0.25 -5.067 -7.281 -0.25 -2.797
  [4,15,-8.971,-0.25,-2.328,-10.156,-0.25,-4.912,-9.091,-0.25,-5.067,-7.281,-0.25,-2.797],
// 4 15 -9.581 -0.25 5.18 -13.726 -0.25 5.18 -13.726 -0.25 -0.884 -9.581 -0.25 -1.028
  [4,15,-9.581,-0.25,5.18,-13.726,-0.25,5.18,-13.726,-0.25,-0.884,-9.581,-0.25,-1.028],
// 4 15 -9.581 -0.25 -1.028 -13.726 -0.25 -0.884 -13.63 -0.25 -1.689 -13.341 -0.25 -2.605
  [4,15,-9.581,-0.25,-1.028,-13.726,-0.25,-0.884,-13.63,-0.25,-1.689,-13.341,-0.25,-2.605],
// 4 15 -8.971 -0.25 -2.328 -9.581 -0.25 -1.028 -13.341 -0.25 -2.605 -12.456 -0.25 -3.777
  [4,15,-8.971,-0.25,-2.328,-9.581,-0.25,-1.028,-13.341,-0.25,-2.605,-12.456,-0.25,-3.777],
// 4 15 -5.601 -0.25 -2.336 -7.281 -0.25 -2.797 -5.376 -0.25 -5.087 -4.045 -0.25 -4.832
  [4,15,-5.601,-0.25,-2.336,-7.281,-0.25,-2.797,-5.376,-0.25,-5.087,-4.045,-0.25,-4.832],
// 4 15 -3.194 -0.25 -4.5 -2.381 -0.25 -3.989 -5.601 -0.25 -2.336 -4.045 -0.25 -4.832
  [4,15,-3.194,-0.25,-4.5,-2.381,-0.25,-3.989,-5.601,-0.25,-2.336,-4.045,-0.25,-4.832],
// 4 15 -5.601 -0.25 -2.336 -2.381 -0.25 -3.989 -1.694 -0.25 -3.338 -1.217 -0.25 -2.587
  [4,15,-5.601,-0.25,-2.336,-2.381,-0.25,-3.989,-1.694,-0.25,-3.338,-1.217,-0.25,-2.587],
// 4 15 -4.992 -0.25 -1.028 -5.601 -0.25 -2.336 -1.217 -0.25 -2.587 -0.939 -0.25 -1.761
  [4,15,-4.992,-0.25,-1.028,-5.601,-0.25,-2.336,-1.217,-0.25,-2.587,-0.939,-0.25,-1.761],
// 4 15 -0.845 -0.25 -0.884 -4.992 -0.25 5.18 -4.992 -0.25 -1.028 -0.939 -0.25 -1.761
  [4,15,-0.845,-0.25,-0.884,-4.992,-0.25,5.18,-4.992,-0.25,-1.028,-0.939,-0.25,-1.761],
// 3 15 -0.845 -0.25 5.18 -4.992 -0.25 5.18 -0.845 -0.25 -0.884
  [3,15,-0.845,-0.25,5.18,-4.992,-0.25,5.18,-0.845,-0.25,-0.884],
// 3 15 -7.281 -0.25 -2.797 -6.951 -0.25 -5.172 -5.376 -0.25 -5.087
  [3,15,-7.281,-0.25,-2.797,-6.951,-0.25,-5.172,-5.376,-0.25,-5.087],
// 4 15 0.949 -0.25 5.18 5.187 -0.25 2.664 9.343 -0.25 2.664 13.581 -0.25 5.18
  [4,15,0.949,-0.25,5.18,5.187,-0.25,2.664,9.343,-0.25,2.664,13.581,-0.25,5.18],
// 3 15 0.949 -0.25 5.18 0.949 -0.25 2.664 5.187 -0.25 2.664
  [3,15,0.949,-0.25,5.18,0.949,-0.25,2.664,5.187,-0.25,2.664],
// 4 15 5.187 -0.25 2.664 5.187 -0.25 -5 9.343 -0.25 -5 9.343 -0.25 2.664
  [4,15,5.187,-0.25,2.664,5.187,-0.25,-5,9.343,-0.25,-5,9.343,-0.25,2.664],
// 3 15 13.581 -0.25 5.18 9.343 -0.25 2.664 13.581 -0.25 2.664
  [3,15,13.581,-0.25,5.18,9.343,-0.25,2.664,13.581,-0.25,2.664],
// 4 15 16.537 -0.25 -3.609 17.341 -0.25 -4.187 19.842 -0.25 -2.147 15.857 -0.25 -2.888
  [4,15,16.537,-0.25,-3.609,17.341,-0.25,-4.187,19.842,-0.25,-2.147,15.857,-0.25,-2.888],
// 4 15 15.344 -0.25 -2.03 15.857 -0.25 -2.888 19.277 -0.25 -1.257 15.035 -0.25 -1.04
  [4,15,15.344,-0.25,-2.03,15.857,-0.25,-2.888,19.277,-0.25,-1.257,15.035,-0.25,-1.04],
// 4 15 19.842 -0.25 -2.147 17.341 -0.25 -4.187 18.271 -0.25 -4.623 20.731 -0.25 -2.652
  [4,15,19.842,-0.25,-2.147,17.341,-0.25,-4.187,18.271,-0.25,-4.623,20.731,-0.25,-2.652],
// 4 15 19.35 -0.25 -4.928 20.603 -0.25 -5.111 20.731 -0.25 -2.652 18.271 -0.25 -4.623
  [4,15,19.35,-0.25,-4.928,20.603,-0.25,-5.111,20.731,-0.25,-2.652,18.271,-0.25,-4.623],
// 4 15 15.035 -0.25 -1.04 19.277 -0.25 -1.257 19.089 -0.25 0.067 14.933 -0.25 0.083
  [4,15,15.035,-0.25,-1.04,19.277,-0.25,-1.257,19.089,-0.25,0.067,14.933,-0.25,0.083],
// 3 15 19.277 -0.25 -1.257 15.857 -0.25 -2.888 19.842 -0.25 -2.147
  [3,15,19.277,-0.25,-1.257,15.857,-0.25,-2.888,19.842,-0.25,-2.147],
// 4 15 19.278 -0.25 1.402 15.963 -0.25 3.2 15.391 -0.25 2.299 15.047 -0.25 1.26
  [4,15,19.278,-0.25,1.402,15.963,-0.25,3.2,15.391,-0.25,2.299,15.047,-0.25,1.26],
// 4 15 19.847 -0.25 2.295 17.77 -0.25 4.57 16.764 -0.25 3.963 15.963 -0.25 3.2
  [4,15,19.847,-0.25,2.295,17.77,-0.25,4.57,16.764,-0.25,3.963,15.963,-0.25,3.2],
// 4 15 15.047 -0.25 1.26 14.933 -0.25 0.083 19.089 -0.25 0.067 19.278 -0.25 1.402
  [4,15,15.047,-0.25,1.26,14.933,-0.25,0.083,19.089,-0.25,0.067,19.278,-0.25,1.402],
// 4 15 19.847 -0.25 2.295 20.728 -0.25 2.801 18.955 -0.25 5.005 17.77 -0.25 4.57
  [4,15,19.847,-0.25,2.295,20.728,-0.25,2.801,18.955,-0.25,5.005,17.77,-0.25,4.57],
// 4 15 20.321 -0.25 5.265 18.955 -0.25 5.005 20.728 -0.25 2.801 21.857 -0.25 2.969
  [4,15,20.321,-0.25,5.265,18.955,-0.25,5.005,20.728,-0.25,2.801,21.857,-0.25,2.969],
// 4 15 21.865 -0.25 5.351 20.321 -0.25 5.265 21.857 -0.25 2.969 23.445 -0.25 5.267
  [4,15,21.865,-0.25,5.351,20.321,-0.25,5.265,21.857,-0.25,2.969,23.445,-0.25,5.267],
// 3 15 15.963 -0.25 3.2 19.278 -0.25 1.402 19.847 -0.25 2.295
  [3,15,15.963,-0.25,3.2,19.278,-0.25,1.402,19.847,-0.25,2.295],
// 4 15 21.893 -0.25 -2.82 20.731 -0.25 -2.652 20.603 -0.25 -5.111 22.03 -0.25 -5.172
  [4,15,21.893,-0.25,-2.82,20.731,-0.25,-2.652,20.603,-0.25,-5.111,22.03,-0.25,-5.172],
// 4 15 21.893 -0.25 -2.82 22.03 -0.25 -5.172 23.438 -0.25 -5.101 23.076 -0.25 -2.655
  [4,15,21.893,-0.25,-2.82,22.03,-0.25,-5.172,23.438,-0.25,-5.101,23.076,-0.25,-2.655],
// 4 15 23.957 -0.25 -2.161 23.076 -0.25 -2.655 25.762 -0.25 -4.537 26.682 -0.25 -4.057
  [4,15,23.957,-0.25,-2.161,23.076,-0.25,-2.655,25.762,-0.25,-4.537,26.682,-0.25,-4.057],
// 4 15 27.445 -0.25 -3.465 24.363 -0.25 -1.605 23.957 -0.25 -2.161 26.682 -0.25 -4.057
  [4,15,27.445,-0.25,-3.465,24.363,-0.25,-1.605,23.957,-0.25,-2.161,26.682,-0.25,-4.057],
// 4 15 23.076 -0.25 -2.655 23.438 -0.25 -5.101 24.682 -0.25 -4.889 25.762 -0.25 -4.537
  [4,15,23.076,-0.25,-2.655,23.438,-0.25,-5.101,24.682,-0.25,-4.889,25.762,-0.25,-4.537],
// 4 15 24.363 -0.25 -1.605 28.052 -0.25 -2.76 28.492 -0.25 -1.927 24.607 -0.25 -0.816
  [4,15,24.363,-0.25,-1.605,28.052,-0.25,-2.76,28.492,-0.25,-1.927,24.607,-0.25,-0.816],
// 3 15 24.363 -0.25 -1.605 27.445 -0.25 -3.465 28.052 -0.25 -2.76
  [3,15,24.363,-0.25,-1.605,27.445,-0.25,-3.465,28.052,-0.25,-2.76],
// 4 15 24.607 -0.25 -0.816 28.492 -0.25 -1.927 28.756 -0.25 -0.952 24.688 -0.25 0.206
  [4,15,24.607,-0.25,-0.816,28.492,-0.25,-1.927,28.756,-0.25,-0.952,24.688,-0.25,0.206],
// 4 15 24.497 -0.25 1.449 24.688 -0.25 0.206 28.73 -0.25 1.327 28.391 -0.25 2.35
  [4,15,24.497,-0.25,1.449,24.688,-0.25,0.206,28.73,-0.25,1.327,28.391,-0.25,2.35],
// 4 15 24.832 -0.25 5.011 23.445 -0.25 5.267 23.027 -0.25 2.803 23.925 -0.25 2.306
  [4,15,24.832,-0.25,5.011,23.445,-0.25,5.267,23.027,-0.25,2.803,23.925,-0.25,2.306],
// 3 15 23.445 -0.25 5.267 21.857 -0.25 2.969 23.027 -0.25 2.803
  [3,15,23.445,-0.25,5.267,21.857,-0.25,2.969,23.027,-0.25,2.803],
// 4 15 27.824 -0.25 3.238 23.925 -0.25 2.306 24.497 -0.25 1.449 28.391 -0.25 2.35
  [4,15,27.824,-0.25,3.238,23.925,-0.25,2.306,24.497,-0.25,1.449,28.391,-0.25,2.35],
// 4 15 26.028 -0.25 4.585 24.832 -0.25 5.011 23.925 -0.25 2.306 27.031 -0.25 3.988
  [4,15,26.028,-0.25,4.585,24.832,-0.25,5.011,23.925,-0.25,2.306,27.031,-0.25,3.988],
// 3 15 27.031 -0.25 3.988 23.925 -0.25 2.306 27.824 -0.25 3.238
  [3,15,27.031,-0.25,3.988,23.925,-0.25,2.306,27.824,-0.25,3.238],
// 4 15 28.844 -0.25 0.167 28.73 -0.25 1.327 24.688 -0.25 0.206 28.756 -0.25 -0.952
  [4,15,28.844,-0.25,0.167,28.73,-0.25,1.327,24.688,-0.25,0.206,28.756,-0.25,-0.952],
// 0 //
// 3 4 -25.451 -0.25 -5 -29.689 -0.25 -5 -37.5 -0.25 -9
  [3,4,-25.451,-0.25,-5,-29.689,-0.25,-5,-37.5,-0.25,-9],
// 4 4 -19.413 -0.25 -5 -25.451 -0.25 -5 -37.5 -0.25 -9 -6.951 -0.25 -5.172
  [4,4,-19.413,-0.25,-5,-25.451,-0.25,-5,-37.5,-0.25,-9,-6.951,-0.25,-5.172],
// 4 4 -37.5 -0.25 9 -37.5 -0.25 -9 -29.689 -0.25 -5 -24.646 -0.25 5.18
  [4,4,-37.5,-0.25,9,-37.5,-0.25,-9,-29.689,-0.25,-5,-24.646,-0.25,5.18],
// 4 4 -7.977 -0.25 -5.146 -9.091 -0.25 -5.067 -15.066 -0.25 -5 -19.413 -0.25 -5
  [4,4,-7.977,-0.25,-5.146,-9.091,-0.25,-5.067,-15.066,-0.25,-5,-19.413,-0.25,-5],
// 3 4 -10.156 -0.25 -4.912 -15.066 -0.25 -5 -9.091 -0.25 -5.067
  [3,4,-10.156,-0.25,-4.912,-15.066,-0.25,-5,-9.091,-0.25,-5.067],
// 4 4 -25.451 -0.25 -5 -19.413 -0.25 -5 -19.684 -0.25 -4.32 -25.188 -0.25 -4.32
  [4,4,-25.451,-0.25,-5,-19.413,-0.25,-5,-19.684,-0.25,-4.32,-25.188,-0.25,-4.32],
// 3 4 -13.63 -0.25 -1.689 -15.066 -0.25 -5 -13.341 -0.25 -2.605
  [3,4,-13.63,-0.25,-1.689,-15.066,-0.25,-5,-13.341,-0.25,-2.605],
// 4 4 -15.066 -0.25 -5 -13.63 -0.25 -1.689 -13.726 -0.25 -0.884 -20.101 -0.25 5.18
  [4,4,-15.066,-0.25,-5,-13.63,-0.25,-1.689,-13.726,-0.25,-0.884,-20.101,-0.25,5.18],
// 3 4 -13.341 -0.25 -2.605 -15.066 -0.25 -5 -12.456 -0.25 -3.777
  [3,4,-13.341,-0.25,-2.605,-15.066,-0.25,-5,-12.456,-0.25,-3.777],
// 3 4 -12.456 -0.25 -3.777 -15.066 -0.25 -5 -11.031 -0.25 -4.655
  [3,4,-12.456,-0.25,-3.777,-15.066,-0.25,-5,-11.031,-0.25,-4.655],
// 3 4 -11.031 -0.25 -4.655 -15.066 -0.25 -5 -10.156 -0.25 -4.912
  [3,4,-11.031,-0.25,-4.655,-15.066,-0.25,-5,-10.156,-0.25,-4.912],
// 3 4 -19.413 -0.25 -5 -6.951 -0.25 -5.172 -7.977 -0.25 -5.146
  [3,4,-19.413,-0.25,-5,-6.951,-0.25,-5.172,-7.977,-0.25,-5.146],
// 4 4 5.187 -0.25 -5 -5.376 -0.25 -5.087 -6.951 -0.25 -5.172 9.343 -0.25 -5
  [4,4,5.187,-0.25,-5,-5.376,-0.25,-5.087,-6.951,-0.25,-5.172,9.343,-0.25,-5],
// 3 4 -3.194 -0.25 -4.5 -4.045 -0.25 -4.832 5.187 -0.25 -5
  [3,4,-3.194,-0.25,-4.5,-4.045,-0.25,-4.832,5.187,-0.25,-5],
// 3 4 -4.045 -0.25 -4.832 -5.376 -0.25 -5.087 5.187 -0.25 -5
  [3,4,-4.045,-0.25,-4.832,-5.376,-0.25,-5.087,5.187,-0.25,-5],
// 3 4 -0.939 -0.25 -1.761 -1.217 -0.25 -2.587 5.187 -0.25 -5
  [3,4,-0.939,-0.25,-1.761,-1.217,-0.25,-2.587,5.187,-0.25,-5],
// 4 4 9.343 -0.25 -5 -6.951 -0.25 -5.172 22.03 -0.25 -5.172 20.603 -0.25 -5.111
  [4,4,9.343,-0.25,-5,-6.951,-0.25,-5.172,22.03,-0.25,-5.172,20.603,-0.25,-5.111],
// 4 4 -9.581 -0.25 -1.028 -8.971 -0.25 -2.328 -7.281 -0.25 -2.797 -4.992 -0.25 -1.028
  [4,4,-9.581,-0.25,-1.028,-8.971,-0.25,-2.328,-7.281,-0.25,-2.797,-4.992,-0.25,-1.028],
// 3 4 -4.992 -0.25 -1.028 -7.281 -0.25 -2.797 -5.601 -0.25 -2.336
  [3,4,-4.992,-0.25,-1.028,-7.281,-0.25,-2.797,-5.601,-0.25,-2.336],
// 3 4 -2.381 -0.25 -3.989 -3.194 -0.25 -4.5 5.187 -0.25 -5
  [3,4,-2.381,-0.25,-3.989,-3.194,-0.25,-4.5,5.187,-0.25,-5],
// 3 4 -1.217 -0.25 -2.587 -1.694 -0.25 -3.338 5.187 -0.25 -5
  [3,4,-1.217,-0.25,-2.587,-1.694,-0.25,-3.338,5.187,-0.25,-5],
// 3 4 -1.694 -0.25 -3.338 -2.381 -0.25 -3.989 5.187 -0.25 -5
  [3,4,-1.694,-0.25,-3.338,-2.381,-0.25,-3.989,5.187,-0.25,-5],
// 4 4 -6.951 -0.25 -5.172 -37.5 -0.25 -9 37.5 -0.25 -9 22.03 -0.25 -5.172
  [4,4,-6.951,-0.25,-5.172,-37.5,-0.25,-9,37.5,-0.25,-9,22.03,-0.25,-5.172],
// 3 4 -22.425 -0.25 2.542 -24.303 -0.25 -2.117 -20.552 -0.25 -2.117
  [3,4,-22.425,-0.25,2.542,-24.303,-0.25,-2.117,-20.552,-0.25,-2.117],
// 4 4 -9.581 -0.25 5.18 -9.581 -0.25 -1.028 -4.992 -0.25 -1.028 -4.992 -0.25 5.18
  [4,4,-9.581,-0.25,5.18,-9.581,-0.25,-1.028,-4.992,-0.25,-1.028,-4.992,-0.25,5.18],
// 3 4 -37.5 -0.25 9 -24.646 -0.25 5.18 -20.101 -0.25 5.18
  [3,4,-37.5,-0.25,9,-24.646,-0.25,5.18,-20.101,-0.25,5.18],
// 3 4 -37.5 -0.25 9 -20.101 -0.25 5.18 -13.726 -0.25 5.18
  [3,4,-37.5,-0.25,9,-20.101,-0.25,5.18,-13.726,-0.25,5.18],
// 3 4 -13.726 -0.25 5.18 -20.101 -0.25 5.18 -13.726 -0.25 -0.884
  [3,4,-13.726,-0.25,5.18,-20.101,-0.25,5.18,-13.726,-0.25,-0.884],
// 3 4 -37.5 -0.25 9 -13.726 -0.25 5.18 -9.581 -0.25 5.18
  [3,4,-37.5,-0.25,9,-13.726,-0.25,5.18,-9.581,-0.25,5.18],
// 3 4 -37.5 -0.25 9 -9.581 -0.25 5.18 -4.992 -0.25 5.18
  [3,4,-37.5,-0.25,9,-9.581,-0.25,5.18,-4.992,-0.25,5.18],
// 4 4 5.187 -0.25 2.664 0.949 -0.25 2.664 -0.845 -0.25 -0.884 5.187 -0.25 -5
  [4,4,5.187,-0.25,2.664,0.949,-0.25,2.664,-0.845,-0.25,-0.884,5.187,-0.25,-5],
// 3 4 -0.845 -0.25 -0.884 -0.939 -0.25 -1.761 5.187 -0.25 -5
  [3,4,-0.845,-0.25,-0.884,-0.939,-0.25,-1.761,5.187,-0.25,-5],
// 4 4 -0.845 -0.25 5.18 -0.845 -0.25 -0.884 0.949 -0.25 2.664 0.949 -0.25 5.18
  [4,4,-0.845,-0.25,5.18,-0.845,-0.25,-0.884,0.949,-0.25,2.664,0.949,-0.25,5.18],
// 4 4 15.035 -0.25 -1.04 14.933 -0.25 0.083 9.343 -0.25 2.664 9.343 -0.25 -5
  [4,4,15.035,-0.25,-1.04,14.933,-0.25,0.083,9.343,-0.25,2.664,9.343,-0.25,-5],
// 4 4 14.933 -0.25 0.083 15.047 -0.25 1.26 13.581 -0.25 2.664 9.343 -0.25 2.664
  [4,4,14.933,-0.25,0.083,15.047,-0.25,1.26,13.581,-0.25,2.664,9.343,-0.25,2.664],
// 4 4 -37.5 -0.25 9 -4.992 -0.25 5.18 -0.845 -0.25 5.18 37.5 -0.25 9
  [4,4,-37.5,-0.25,9,-4.992,-0.25,5.18,-0.845,-0.25,5.18,37.5,-0.25,9],
// 4 4 13.581 -0.25 5.18 13.581 -0.25 2.664 15.963 -0.25 3.2 16.764 -0.25 3.963
  [4,4,13.581,-0.25,5.18,13.581,-0.25,2.664,15.963,-0.25,3.2,16.764,-0.25,3.963],
// 4 4 37.5 -0.25 9 -0.845 -0.25 5.18 0.949 -0.25 5.18 21.865 -0.25 5.351
  [4,4,37.5,-0.25,9,-0.845,-0.25,5.18,0.949,-0.25,5.18,21.865,-0.25,5.351],
// 3 4 13.581 -0.25 2.664 15.047 -0.25 1.26 15.391 -0.25 2.299
  [3,4,13.581,-0.25,2.664,15.047,-0.25,1.26,15.391,-0.25,2.299],
// 4 4 21.865 -0.25 5.351 0.949 -0.25 5.18 13.581 -0.25 5.18 20.321 -0.25 5.265
  [4,4,21.865,-0.25,5.351,0.949,-0.25,5.18,13.581,-0.25,5.18,20.321,-0.25,5.265],
// 3 4 15.035 -0.25 -1.04 9.343 -0.25 -5 15.344 -0.25 -2.03
  [3,4,15.035,-0.25,-1.04,9.343,-0.25,-5,15.344,-0.25,-2.03],
// 3 4 16.537 -0.25 -3.609 9.343 -0.25 -5 17.341 -0.25 -4.187
  [3,4,16.537,-0.25,-3.609,9.343,-0.25,-5,17.341,-0.25,-4.187],
// 3 4 17.341 -0.25 -4.187 9.343 -0.25 -5 18.271 -0.25 -4.623
  [3,4,17.341,-0.25,-4.187,9.343,-0.25,-5,18.271,-0.25,-4.623],
// 3 4 19.35 -0.25 -4.928 9.343 -0.25 -5 20.603 -0.25 -5.111
  [3,4,19.35,-0.25,-4.928,9.343,-0.25,-5,20.603,-0.25,-5.111],
// 3 4 18.271 -0.25 -4.623 9.343 -0.25 -5 19.35 -0.25 -4.928
  [3,4,18.271,-0.25,-4.623,9.343,-0.25,-5,19.35,-0.25,-4.928],
// 3 4 15.344 -0.25 -2.03 9.343 -0.25 -5 15.857 -0.25 -2.888
  [3,4,15.344,-0.25,-2.03,9.343,-0.25,-5,15.857,-0.25,-2.888],
// 4 4 20.731 -0.25 -2.652 21.893 -0.25 -2.82 19.277 -0.25 -1.257 19.842 -0.25 -2.147
  [4,4,20.731,-0.25,-2.652,21.893,-0.25,-2.82,19.277,-0.25,-1.257,19.842,-0.25,-2.147],
// 4 4 19.277 -0.25 -1.257 21.893 -0.25 -2.82 24.363 -0.25 -1.605 24.607 -0.25 -0.816
  [4,4,19.277,-0.25,-1.257,21.893,-0.25,-2.82,24.363,-0.25,-1.605,24.607,-0.25,-0.816],
// 3 4 15.857 -0.25 -2.888 9.343 -0.25 -5 16.537 -0.25 -3.609
  [3,4,15.857,-0.25,-2.888,9.343,-0.25,-5,16.537,-0.25,-3.609],
// 3 4 24.682 -0.25 -4.889 23.438 -0.25 -5.101 37.5 -0.25 -9
  [3,4,24.682,-0.25,-4.889,23.438,-0.25,-5.101,37.5,-0.25,-9],
// 3 4 25.762 -0.25 -4.537 24.682 -0.25 -4.889 37.5 -0.25 -9
  [3,4,25.762,-0.25,-4.537,24.682,-0.25,-4.889,37.5,-0.25,-9],
// 3 4 27.445 -0.25 -3.465 26.682 -0.25 -4.057 37.5 -0.25 -9
  [3,4,27.445,-0.25,-3.465,26.682,-0.25,-4.057,37.5,-0.25,-9],
// 3 4 26.682 -0.25 -4.057 25.762 -0.25 -4.537 37.5 -0.25 -9
  [3,4,26.682,-0.25,-4.057,25.762,-0.25,-4.537,37.5,-0.25,-9],
// 3 4 28.052 -0.25 -2.76 27.445 -0.25 -3.465 37.5 -0.25 -9
  [3,4,28.052,-0.25,-2.76,27.445,-0.25,-3.465,37.5,-0.25,-9],
// 3 4 23.438 -0.25 -5.101 22.03 -0.25 -5.172 37.5 -0.25 -9
  [3,4,23.438,-0.25,-5.101,22.03,-0.25,-5.172,37.5,-0.25,-9],
// 4 4 23.076 -0.25 -2.655 23.957 -0.25 -2.161 24.363 -0.25 -1.605 21.893 -0.25 -2.82
  [4,4,23.076,-0.25,-2.655,23.957,-0.25,-2.161,24.363,-0.25,-1.605,21.893,-0.25,-2.82],
// 3 4 28.492 -0.25 -1.927 28.052 -0.25 -2.76 37.5 -0.25 -9
  [3,4,28.492,-0.25,-1.927,28.052,-0.25,-2.76,37.5,-0.25,-9],
// 3 4 28.756 -0.25 -0.952 28.492 -0.25 -1.927 37.5 -0.25 -9
  [3,4,28.756,-0.25,-0.952,28.492,-0.25,-1.927,37.5,-0.25,-9],
// 4 4 28.844 -0.25 0.167 28.756 -0.25 -0.952 37.5 -0.25 -9 37.5 -0.25 9
  [4,4,28.844,-0.25,0.167,28.756,-0.25,-0.952,37.5,-0.25,-9,37.5,-0.25,9],
// 4 4 19.089 -0.25 0.067 19.277 -0.25 -1.257 24.607 -0.25 -0.816 24.688 -0.25 0.206
  [4,4,19.089,-0.25,0.067,19.277,-0.25,-1.257,24.607,-0.25,-0.816,24.688,-0.25,0.206],
// 4 4 19.278 -0.25 1.402 24.497 -0.25 1.449 21.857 -0.25 2.969 19.847 -0.25 2.295
  [4,4,19.278,-0.25,1.402,24.497,-0.25,1.449,21.857,-0.25,2.969,19.847,-0.25,2.295],
// 3 4 21.857 -0.25 2.969 20.728 -0.25 2.801 19.847 -0.25 2.295
  [3,4,21.857,-0.25,2.969,20.728,-0.25,2.801,19.847,-0.25,2.295],
// 4 4 19.278 -0.25 1.402 19.089 -0.25 0.067 24.688 -0.25 0.206 24.497 -0.25 1.449
  [4,4,19.278,-0.25,1.402,19.089,-0.25,0.067,24.688,-0.25,0.206,24.497,-0.25,1.449],
// 3 4 13.581 -0.25 5.18 16.764 -0.25 3.963 17.77 -0.25 4.57
  [3,4,13.581,-0.25,5.18,16.764,-0.25,3.963,17.77,-0.25,4.57],
// 3 4 20.321 -0.25 5.265 13.581 -0.25 5.18 18.955 -0.25 5.005
  [3,4,20.321,-0.25,5.265,13.581,-0.25,5.18,18.955,-0.25,5.005],
// 3 4 13.581 -0.25 5.18 17.77 -0.25 4.57 18.955 -0.25 5.005
  [3,4,13.581,-0.25,5.18,17.77,-0.25,4.57,18.955,-0.25,5.005],
// 3 4 15.963 -0.25 3.2 13.581 -0.25 2.664 15.391 -0.25 2.299
  [3,4,15.963,-0.25,3.2,13.581,-0.25,2.664,15.391,-0.25,2.299],
// 4 4 23.027 -0.25 2.803 21.857 -0.25 2.969 24.497 -0.25 1.449 23.925 -0.25 2.306
  [4,4,23.027,-0.25,2.803,21.857,-0.25,2.969,24.497,-0.25,1.449,23.925,-0.25,2.306],
// 3 4 37.5 -0.25 9 28.73 -0.25 1.327 28.844 -0.25 0.167
  [3,4,37.5,-0.25,9,28.73,-0.25,1.327,28.844,-0.25,0.167],
// 3 4 37.5 -0.25 9 28.391 -0.25 2.35 28.73 -0.25 1.327
  [3,4,37.5,-0.25,9,28.391,-0.25,2.35,28.73,-0.25,1.327],
// 3 4 37.5 -0.25 9 23.445 -0.25 5.267 24.832 -0.25 5.011
  [3,4,37.5,-0.25,9,23.445,-0.25,5.267,24.832,-0.25,5.011],
// 3 4 37.5 -0.25 9 27.031 -0.25 3.988 27.824 -0.25 3.238
  [3,4,37.5,-0.25,9,27.031,-0.25,3.988,27.824,-0.25,3.238],
// 3 4 37.5 -0.25 9 24.832 -0.25 5.011 26.028 -0.25 4.585
  [3,4,37.5,-0.25,9,24.832,-0.25,5.011,26.028,-0.25,4.585],
// 3 4 37.5 -0.25 9 26.028 -0.25 4.585 27.031 -0.25 3.988
  [3,4,37.5,-0.25,9,26.028,-0.25,4.585,27.031,-0.25,3.988],
// 3 4 37.5 -0.25 9 27.824 -0.25 3.238 28.391 -0.25 2.35
  [3,4,37.5,-0.25,9,27.824,-0.25,3.238,28.391,-0.25,2.35],
// 3 4 37.5 -0.25 9 21.865 -0.25 5.351 23.445 -0.25 5.267
  [3,4,37.5,-0.25,9,21.865,-0.25,5.351,23.445,-0.25,5.267],
];
module ldraw_lib__190435a(step=0, col=false, unit=2/5, alt=false, line=0.2, solid=!$preview)
    makepoly(ldraw_lib__190435a(solid), step=step, col=col, unit=unit, alt=alt, line=line, solid=solid);
ldraw_lib__190435a(line=0.2);
